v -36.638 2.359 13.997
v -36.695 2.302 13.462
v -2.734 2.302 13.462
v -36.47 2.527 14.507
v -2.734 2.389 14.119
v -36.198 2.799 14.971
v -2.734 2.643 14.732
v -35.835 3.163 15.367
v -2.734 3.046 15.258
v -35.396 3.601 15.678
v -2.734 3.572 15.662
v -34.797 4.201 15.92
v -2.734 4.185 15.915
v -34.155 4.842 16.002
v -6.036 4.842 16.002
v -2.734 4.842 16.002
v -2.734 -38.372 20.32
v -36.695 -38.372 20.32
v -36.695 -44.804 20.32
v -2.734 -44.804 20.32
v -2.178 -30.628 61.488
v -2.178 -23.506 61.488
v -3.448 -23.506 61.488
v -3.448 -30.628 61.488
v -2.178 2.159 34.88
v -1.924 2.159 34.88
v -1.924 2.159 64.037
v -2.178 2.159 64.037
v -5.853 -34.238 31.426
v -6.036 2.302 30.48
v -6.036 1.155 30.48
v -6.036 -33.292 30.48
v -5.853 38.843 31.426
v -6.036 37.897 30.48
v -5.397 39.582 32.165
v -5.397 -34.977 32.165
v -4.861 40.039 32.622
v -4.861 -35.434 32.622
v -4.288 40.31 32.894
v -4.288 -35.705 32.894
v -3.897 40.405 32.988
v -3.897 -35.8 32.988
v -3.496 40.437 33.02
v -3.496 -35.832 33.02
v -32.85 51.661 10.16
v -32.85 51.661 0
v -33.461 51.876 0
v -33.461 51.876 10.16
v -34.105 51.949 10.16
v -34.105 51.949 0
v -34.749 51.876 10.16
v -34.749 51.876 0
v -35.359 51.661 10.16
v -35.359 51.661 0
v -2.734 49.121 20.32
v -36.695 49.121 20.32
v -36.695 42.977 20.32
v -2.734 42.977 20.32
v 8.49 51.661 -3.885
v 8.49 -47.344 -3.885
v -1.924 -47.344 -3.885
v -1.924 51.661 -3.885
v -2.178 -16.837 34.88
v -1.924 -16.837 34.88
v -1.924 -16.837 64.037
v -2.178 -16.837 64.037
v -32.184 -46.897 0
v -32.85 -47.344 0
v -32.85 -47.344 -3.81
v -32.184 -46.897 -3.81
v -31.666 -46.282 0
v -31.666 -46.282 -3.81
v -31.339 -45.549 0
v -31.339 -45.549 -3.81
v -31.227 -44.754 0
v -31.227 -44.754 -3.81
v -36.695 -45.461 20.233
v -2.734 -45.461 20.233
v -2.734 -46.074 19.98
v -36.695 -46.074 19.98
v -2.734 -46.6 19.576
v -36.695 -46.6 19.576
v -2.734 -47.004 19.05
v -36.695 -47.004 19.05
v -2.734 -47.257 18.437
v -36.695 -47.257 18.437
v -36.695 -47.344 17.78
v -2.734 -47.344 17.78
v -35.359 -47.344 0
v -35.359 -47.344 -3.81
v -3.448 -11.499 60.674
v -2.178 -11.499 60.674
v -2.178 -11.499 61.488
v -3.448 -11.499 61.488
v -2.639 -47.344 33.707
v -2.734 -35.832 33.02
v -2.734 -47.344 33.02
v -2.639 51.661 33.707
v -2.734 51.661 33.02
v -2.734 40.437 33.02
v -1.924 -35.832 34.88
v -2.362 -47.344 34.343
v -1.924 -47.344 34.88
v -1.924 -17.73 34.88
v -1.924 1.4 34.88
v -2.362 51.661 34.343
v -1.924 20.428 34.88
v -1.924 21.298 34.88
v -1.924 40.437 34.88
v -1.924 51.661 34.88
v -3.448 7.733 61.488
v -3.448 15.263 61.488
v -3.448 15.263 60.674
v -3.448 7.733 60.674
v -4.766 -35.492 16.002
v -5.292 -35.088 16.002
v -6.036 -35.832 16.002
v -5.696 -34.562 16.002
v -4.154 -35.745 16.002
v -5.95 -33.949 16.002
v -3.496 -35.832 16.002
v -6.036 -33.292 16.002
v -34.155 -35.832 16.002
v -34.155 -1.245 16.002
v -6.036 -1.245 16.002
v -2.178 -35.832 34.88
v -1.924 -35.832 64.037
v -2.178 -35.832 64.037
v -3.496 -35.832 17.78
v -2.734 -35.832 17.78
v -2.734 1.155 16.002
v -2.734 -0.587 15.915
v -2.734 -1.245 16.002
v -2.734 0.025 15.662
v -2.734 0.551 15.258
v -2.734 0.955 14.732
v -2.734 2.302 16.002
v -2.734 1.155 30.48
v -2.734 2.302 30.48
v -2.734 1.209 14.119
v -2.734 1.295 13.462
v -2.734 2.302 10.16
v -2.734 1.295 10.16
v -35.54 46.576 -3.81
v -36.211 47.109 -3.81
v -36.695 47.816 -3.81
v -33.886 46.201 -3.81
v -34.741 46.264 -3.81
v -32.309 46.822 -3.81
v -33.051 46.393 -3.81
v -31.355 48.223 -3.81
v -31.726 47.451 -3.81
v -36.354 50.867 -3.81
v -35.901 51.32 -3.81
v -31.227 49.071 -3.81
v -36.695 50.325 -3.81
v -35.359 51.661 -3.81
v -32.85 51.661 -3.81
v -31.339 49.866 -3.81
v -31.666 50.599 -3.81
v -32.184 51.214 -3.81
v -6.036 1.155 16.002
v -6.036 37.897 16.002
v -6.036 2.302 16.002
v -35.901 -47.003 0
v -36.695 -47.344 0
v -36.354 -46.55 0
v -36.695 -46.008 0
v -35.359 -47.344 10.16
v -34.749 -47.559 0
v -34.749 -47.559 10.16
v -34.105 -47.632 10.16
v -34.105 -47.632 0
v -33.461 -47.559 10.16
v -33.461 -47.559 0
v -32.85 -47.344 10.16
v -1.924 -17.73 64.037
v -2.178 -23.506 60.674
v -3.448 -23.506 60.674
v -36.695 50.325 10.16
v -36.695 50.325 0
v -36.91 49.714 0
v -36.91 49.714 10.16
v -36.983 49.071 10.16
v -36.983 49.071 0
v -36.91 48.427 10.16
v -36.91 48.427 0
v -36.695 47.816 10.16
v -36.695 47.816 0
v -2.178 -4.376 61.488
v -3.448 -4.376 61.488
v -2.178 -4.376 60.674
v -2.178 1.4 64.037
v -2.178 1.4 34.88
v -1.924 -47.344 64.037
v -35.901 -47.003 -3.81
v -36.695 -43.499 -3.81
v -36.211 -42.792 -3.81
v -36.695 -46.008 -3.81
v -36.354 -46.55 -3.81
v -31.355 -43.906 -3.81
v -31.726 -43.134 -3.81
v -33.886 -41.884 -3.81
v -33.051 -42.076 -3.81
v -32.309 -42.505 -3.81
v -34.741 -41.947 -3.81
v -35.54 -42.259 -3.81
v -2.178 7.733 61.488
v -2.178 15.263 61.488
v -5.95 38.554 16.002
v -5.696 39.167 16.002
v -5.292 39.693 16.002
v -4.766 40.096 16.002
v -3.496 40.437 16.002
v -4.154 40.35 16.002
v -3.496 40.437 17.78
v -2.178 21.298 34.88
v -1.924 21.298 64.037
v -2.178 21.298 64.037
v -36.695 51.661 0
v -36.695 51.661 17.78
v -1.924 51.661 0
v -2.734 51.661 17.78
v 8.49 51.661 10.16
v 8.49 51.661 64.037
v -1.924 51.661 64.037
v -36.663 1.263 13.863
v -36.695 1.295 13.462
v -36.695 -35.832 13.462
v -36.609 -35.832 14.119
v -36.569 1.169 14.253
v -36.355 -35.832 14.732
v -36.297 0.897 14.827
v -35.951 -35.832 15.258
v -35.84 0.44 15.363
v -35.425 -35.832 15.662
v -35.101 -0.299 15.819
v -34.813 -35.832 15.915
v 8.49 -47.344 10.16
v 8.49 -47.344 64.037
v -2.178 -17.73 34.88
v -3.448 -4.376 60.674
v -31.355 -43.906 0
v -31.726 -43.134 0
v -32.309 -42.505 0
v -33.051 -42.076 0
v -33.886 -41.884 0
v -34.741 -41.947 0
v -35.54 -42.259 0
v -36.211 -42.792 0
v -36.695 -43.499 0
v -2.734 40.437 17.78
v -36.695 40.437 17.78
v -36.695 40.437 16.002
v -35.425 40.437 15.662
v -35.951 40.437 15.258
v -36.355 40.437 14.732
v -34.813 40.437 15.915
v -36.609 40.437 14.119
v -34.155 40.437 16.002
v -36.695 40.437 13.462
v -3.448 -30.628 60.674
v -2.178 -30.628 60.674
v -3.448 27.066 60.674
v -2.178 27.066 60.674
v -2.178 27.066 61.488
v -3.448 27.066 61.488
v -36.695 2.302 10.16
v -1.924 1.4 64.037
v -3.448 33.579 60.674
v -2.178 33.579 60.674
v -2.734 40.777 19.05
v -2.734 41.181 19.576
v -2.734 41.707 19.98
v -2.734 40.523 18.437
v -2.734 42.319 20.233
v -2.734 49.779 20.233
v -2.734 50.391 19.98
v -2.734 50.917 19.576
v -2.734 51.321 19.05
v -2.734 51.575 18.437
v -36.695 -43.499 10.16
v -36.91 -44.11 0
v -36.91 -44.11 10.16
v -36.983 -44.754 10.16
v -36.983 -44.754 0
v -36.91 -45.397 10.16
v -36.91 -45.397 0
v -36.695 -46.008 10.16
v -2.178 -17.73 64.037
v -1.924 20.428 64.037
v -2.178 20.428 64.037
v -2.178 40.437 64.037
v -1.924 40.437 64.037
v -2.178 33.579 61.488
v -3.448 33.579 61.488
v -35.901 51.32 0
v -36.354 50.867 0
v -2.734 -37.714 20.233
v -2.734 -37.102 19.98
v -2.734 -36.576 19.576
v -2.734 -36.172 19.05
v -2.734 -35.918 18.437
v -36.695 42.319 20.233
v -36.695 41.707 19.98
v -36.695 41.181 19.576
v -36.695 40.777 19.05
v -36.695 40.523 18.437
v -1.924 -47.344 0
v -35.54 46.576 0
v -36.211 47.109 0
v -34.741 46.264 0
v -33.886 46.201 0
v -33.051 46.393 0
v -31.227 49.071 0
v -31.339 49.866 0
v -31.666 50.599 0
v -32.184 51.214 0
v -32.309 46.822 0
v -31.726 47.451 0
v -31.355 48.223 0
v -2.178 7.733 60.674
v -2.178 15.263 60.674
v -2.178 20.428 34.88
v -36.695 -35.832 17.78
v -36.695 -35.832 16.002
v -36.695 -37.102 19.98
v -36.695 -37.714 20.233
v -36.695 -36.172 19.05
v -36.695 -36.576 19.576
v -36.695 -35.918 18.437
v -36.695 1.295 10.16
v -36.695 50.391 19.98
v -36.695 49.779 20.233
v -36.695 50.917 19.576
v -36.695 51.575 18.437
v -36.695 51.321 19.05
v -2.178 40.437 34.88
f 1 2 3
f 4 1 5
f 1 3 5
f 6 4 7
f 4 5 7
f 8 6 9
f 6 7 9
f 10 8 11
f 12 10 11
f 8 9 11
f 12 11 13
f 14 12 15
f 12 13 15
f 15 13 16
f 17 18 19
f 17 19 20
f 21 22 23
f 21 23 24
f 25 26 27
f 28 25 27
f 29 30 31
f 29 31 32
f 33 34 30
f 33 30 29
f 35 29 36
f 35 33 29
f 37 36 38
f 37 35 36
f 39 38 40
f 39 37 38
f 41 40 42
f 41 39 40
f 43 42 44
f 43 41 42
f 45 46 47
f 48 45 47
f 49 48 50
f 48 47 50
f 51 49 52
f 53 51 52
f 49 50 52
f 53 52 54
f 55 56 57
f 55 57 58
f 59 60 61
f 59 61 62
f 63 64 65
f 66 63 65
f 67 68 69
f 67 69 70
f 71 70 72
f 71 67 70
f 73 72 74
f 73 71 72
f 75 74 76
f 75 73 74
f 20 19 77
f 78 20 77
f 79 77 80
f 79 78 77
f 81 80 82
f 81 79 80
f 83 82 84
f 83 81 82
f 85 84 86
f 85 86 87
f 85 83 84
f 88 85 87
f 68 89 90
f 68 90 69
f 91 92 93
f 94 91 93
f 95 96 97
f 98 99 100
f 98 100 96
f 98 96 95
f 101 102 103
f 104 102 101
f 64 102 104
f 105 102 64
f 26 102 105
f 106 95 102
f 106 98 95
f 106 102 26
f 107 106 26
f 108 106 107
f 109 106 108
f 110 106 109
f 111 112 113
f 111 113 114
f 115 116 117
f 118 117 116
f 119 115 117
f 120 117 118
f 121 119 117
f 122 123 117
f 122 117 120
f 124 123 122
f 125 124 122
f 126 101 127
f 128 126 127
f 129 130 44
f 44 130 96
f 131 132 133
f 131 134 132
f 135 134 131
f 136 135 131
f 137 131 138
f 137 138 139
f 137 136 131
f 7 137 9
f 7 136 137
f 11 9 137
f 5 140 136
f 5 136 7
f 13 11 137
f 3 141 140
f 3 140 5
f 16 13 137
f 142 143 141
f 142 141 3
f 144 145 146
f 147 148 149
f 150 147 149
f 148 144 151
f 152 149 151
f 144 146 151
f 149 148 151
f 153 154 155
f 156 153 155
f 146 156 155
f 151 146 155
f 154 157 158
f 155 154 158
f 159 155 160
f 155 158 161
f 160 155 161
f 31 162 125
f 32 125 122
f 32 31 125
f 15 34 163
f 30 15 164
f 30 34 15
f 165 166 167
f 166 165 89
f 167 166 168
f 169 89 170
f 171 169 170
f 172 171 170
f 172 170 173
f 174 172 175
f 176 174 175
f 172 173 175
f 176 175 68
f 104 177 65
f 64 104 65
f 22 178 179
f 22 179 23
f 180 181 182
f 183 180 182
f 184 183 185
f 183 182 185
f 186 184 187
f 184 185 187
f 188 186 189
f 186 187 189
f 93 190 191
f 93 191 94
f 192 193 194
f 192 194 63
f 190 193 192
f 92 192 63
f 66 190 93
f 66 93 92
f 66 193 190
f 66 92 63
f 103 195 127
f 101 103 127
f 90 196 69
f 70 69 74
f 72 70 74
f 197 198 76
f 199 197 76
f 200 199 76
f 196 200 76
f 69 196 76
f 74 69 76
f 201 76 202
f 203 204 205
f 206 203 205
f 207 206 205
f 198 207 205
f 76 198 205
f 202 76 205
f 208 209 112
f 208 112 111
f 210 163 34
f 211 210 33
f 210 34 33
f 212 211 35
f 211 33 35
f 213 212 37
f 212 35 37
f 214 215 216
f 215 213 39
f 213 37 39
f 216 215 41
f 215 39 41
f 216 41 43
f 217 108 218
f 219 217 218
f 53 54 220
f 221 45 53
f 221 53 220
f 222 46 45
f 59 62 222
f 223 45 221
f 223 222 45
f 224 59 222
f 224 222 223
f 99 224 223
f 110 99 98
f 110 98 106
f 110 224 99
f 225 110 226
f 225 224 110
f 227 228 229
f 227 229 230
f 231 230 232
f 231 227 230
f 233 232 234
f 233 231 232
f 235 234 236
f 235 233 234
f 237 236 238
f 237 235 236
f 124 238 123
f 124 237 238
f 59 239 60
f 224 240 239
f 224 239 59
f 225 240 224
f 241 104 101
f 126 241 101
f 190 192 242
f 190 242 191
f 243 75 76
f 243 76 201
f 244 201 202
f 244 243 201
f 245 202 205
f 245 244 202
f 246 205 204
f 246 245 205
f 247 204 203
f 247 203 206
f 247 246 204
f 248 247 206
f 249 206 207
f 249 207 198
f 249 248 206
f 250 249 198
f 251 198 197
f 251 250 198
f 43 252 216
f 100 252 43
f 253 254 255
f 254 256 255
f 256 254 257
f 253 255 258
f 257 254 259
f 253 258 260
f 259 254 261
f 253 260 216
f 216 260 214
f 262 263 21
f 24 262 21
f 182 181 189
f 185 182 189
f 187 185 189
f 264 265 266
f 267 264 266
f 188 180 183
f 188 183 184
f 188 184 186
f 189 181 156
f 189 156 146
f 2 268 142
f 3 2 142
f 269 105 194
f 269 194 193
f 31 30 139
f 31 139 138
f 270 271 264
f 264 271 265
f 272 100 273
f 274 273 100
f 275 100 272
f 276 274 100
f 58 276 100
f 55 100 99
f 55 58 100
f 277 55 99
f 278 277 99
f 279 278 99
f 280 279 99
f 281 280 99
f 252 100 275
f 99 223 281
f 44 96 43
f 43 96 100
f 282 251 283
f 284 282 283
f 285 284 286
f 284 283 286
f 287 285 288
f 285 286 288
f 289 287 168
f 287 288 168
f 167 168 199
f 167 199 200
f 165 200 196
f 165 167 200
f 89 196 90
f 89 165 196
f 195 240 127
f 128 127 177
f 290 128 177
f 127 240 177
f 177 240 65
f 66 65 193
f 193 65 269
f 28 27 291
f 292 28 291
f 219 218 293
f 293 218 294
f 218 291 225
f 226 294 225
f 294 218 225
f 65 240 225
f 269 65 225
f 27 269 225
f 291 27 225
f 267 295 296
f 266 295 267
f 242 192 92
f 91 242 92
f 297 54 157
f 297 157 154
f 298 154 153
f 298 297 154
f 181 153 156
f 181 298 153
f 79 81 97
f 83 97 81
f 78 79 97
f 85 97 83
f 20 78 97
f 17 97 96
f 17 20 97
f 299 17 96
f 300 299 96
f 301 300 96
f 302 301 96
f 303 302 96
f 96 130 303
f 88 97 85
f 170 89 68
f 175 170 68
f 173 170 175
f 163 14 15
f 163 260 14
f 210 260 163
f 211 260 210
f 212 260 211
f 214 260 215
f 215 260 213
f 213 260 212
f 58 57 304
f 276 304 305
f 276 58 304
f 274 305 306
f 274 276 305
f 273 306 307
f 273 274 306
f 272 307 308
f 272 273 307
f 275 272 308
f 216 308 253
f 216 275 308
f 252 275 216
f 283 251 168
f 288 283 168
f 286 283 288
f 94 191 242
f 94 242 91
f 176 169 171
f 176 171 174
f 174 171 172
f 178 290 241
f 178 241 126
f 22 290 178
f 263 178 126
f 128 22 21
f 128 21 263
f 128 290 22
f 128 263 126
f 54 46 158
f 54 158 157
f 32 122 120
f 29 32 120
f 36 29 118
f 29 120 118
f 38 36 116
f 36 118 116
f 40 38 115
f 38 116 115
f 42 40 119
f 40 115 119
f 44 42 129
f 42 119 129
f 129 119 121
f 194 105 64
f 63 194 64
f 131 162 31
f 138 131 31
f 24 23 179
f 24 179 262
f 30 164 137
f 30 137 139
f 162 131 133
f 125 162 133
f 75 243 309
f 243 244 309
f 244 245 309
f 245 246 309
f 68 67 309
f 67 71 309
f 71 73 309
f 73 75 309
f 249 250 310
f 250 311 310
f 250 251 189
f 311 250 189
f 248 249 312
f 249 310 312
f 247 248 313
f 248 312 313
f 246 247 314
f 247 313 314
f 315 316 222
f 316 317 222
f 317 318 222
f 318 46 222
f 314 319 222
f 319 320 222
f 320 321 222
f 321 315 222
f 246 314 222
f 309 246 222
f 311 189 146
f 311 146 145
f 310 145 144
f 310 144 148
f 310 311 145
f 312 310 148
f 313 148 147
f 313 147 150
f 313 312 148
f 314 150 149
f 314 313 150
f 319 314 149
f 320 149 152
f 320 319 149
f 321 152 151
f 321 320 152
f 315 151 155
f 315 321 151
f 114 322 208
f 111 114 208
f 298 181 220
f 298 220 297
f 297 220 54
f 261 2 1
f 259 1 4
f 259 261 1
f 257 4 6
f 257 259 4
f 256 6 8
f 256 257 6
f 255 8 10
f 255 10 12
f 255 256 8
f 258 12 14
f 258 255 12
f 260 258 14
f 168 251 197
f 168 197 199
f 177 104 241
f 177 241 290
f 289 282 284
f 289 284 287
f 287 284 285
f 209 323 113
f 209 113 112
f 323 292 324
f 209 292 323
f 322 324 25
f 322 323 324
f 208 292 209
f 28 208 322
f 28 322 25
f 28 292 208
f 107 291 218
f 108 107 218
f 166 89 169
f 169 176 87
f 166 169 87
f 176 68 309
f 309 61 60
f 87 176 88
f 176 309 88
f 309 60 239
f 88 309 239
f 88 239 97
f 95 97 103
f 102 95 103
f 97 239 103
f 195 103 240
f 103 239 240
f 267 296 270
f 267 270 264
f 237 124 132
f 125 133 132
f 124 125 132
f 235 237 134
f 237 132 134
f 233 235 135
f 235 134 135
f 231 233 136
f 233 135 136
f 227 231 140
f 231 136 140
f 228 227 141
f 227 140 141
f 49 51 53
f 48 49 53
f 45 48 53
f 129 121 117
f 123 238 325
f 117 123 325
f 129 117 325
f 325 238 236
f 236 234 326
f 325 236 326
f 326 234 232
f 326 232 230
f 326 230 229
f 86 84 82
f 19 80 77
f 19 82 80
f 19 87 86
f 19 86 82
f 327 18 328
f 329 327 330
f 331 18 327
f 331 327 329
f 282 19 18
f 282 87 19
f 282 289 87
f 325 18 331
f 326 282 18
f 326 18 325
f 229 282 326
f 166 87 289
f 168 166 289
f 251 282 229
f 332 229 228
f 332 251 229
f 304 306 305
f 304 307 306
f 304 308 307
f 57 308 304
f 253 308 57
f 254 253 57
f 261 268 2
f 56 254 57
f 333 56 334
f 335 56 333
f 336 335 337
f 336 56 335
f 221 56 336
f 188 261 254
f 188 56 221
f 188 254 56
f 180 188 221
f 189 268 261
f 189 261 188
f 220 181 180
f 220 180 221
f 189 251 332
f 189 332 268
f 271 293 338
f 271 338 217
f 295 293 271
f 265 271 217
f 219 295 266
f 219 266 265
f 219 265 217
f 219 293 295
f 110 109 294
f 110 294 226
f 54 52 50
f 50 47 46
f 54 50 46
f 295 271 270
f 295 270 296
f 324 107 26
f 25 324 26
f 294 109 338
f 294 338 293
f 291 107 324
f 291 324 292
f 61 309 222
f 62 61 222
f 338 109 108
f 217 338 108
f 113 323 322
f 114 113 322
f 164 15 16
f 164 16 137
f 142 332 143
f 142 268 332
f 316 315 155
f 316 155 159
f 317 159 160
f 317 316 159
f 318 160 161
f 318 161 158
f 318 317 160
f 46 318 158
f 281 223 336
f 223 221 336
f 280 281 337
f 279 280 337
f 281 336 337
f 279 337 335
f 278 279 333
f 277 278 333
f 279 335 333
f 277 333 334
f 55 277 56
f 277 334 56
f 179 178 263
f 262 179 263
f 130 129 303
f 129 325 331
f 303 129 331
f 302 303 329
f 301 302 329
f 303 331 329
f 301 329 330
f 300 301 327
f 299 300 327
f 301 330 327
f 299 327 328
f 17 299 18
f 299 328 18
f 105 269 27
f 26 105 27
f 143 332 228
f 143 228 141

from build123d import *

# Parameters (mm, degrees)
F0_W          = 22.5927522406
F0_H          = 49.5025906712
F1_DEPTH      = 10.16
F2_DEPTH      = 3.81
F3_W          = 11.2244246993
F3_H          = 99.0051813424
F4_DEPTH      = 25.4
F6_DEPTH      = 10.16
F7_R          = 2.54
F8_W          = 33.9610797819
F8_H          = 38.1342638284
F8_H_2        = 37.1269418392
F9_DEPTH      = 5.842
F10_R         = 2.54
F11_W         = 99.0051813424
F11_H         = 67.9221570026
F12_DEPTH     = 10.414
F13_W         = 38.620619569
F13_H         = 17.018
F13_W_2       = 37.6479080878
F14_DEPTH     = 3.302
F15_T1_DEPTH  = 88.9685276568
F15_T6_DEPTH  = 27.94
F15_T11_DEPTH = 27.94
F16_W         = 1.1473407503
F16_H         = 14.478
F17_DEPTH     = 3.302
F18_W         = 19.139082171
F18_H         = 29.1566260799
F18_W_2       = 6.5123029053
F18_H_2       = 0.8140355349
F18_W_3       = 18.2694643736
F18_W_4       = 7.5298482552
F18_W_5       = 18.2365168585
F18_W_6       = 7.1228295565
F18_W_7       = 18.1018151343
F18_W_8       = 7.1228314191
F19_DEPTH     = 0.254
F20_DEPTH     = 1.524


# Not quite as in the source:
# - a fillet or chamfer that OpenCascade refuses, or shapes differently, is made with other operations: its cross-section is extruded or revolved along the edge and cut away or added
# - a feature names something its author has since deleted; it is built from what else it names


with BuildPart() as f1:
    # F0 (on Top) → F1 (new body)
    with BuildSketch(Plane.XY):
        with BuildLine():
            Line((-35.3594812499, 51.6611337662), (-36.6952344775, 51.6611337662))
            Line((-36.6952344775, 51.6611337662), (-36.6952344775, 50.3253805386))
            ThreePointArc((-36.6952344775, 50.3253805386), (-36.1400711383, 51.105970427), (-35.3594812499, 51.6611337662))
        make_face()
        with BuildLine():
            ThreePointArc((-32.8504798068, 51.6611337662), (-34.1049805284, 51.9489325583), (-35.3594812499, 51.6611337662))
            Line((-35.3594812499, 51.6611337662), (-32.8504798068, 51.6611337662))
        make_face()
        with BuildLine():
            Line((-32.8504798068, 51.6611337662), (-35.3594812499, 51.6611337662))
            ThreePointArc((-35.3594812499, 51.6611337662), (-36.1400711383, 51.105970427), (-36.6952344775, 50.3253805386))
            Line((-36.6952344775, 50.3253805386), (-36.6952344775, 47.8163790954))
            ThreePointArc((-36.6952344775, 47.8163790954), (-33.4614356183, 46.2656993361), (-31.2269277871, 49.070879817))
            ThreePointArc((-31.2269277871, 49.070879817), (-31.6663634179, 50.5993869876), (-32.8504798068, 51.6611337662))
        make_face()
        with BuildLine():
            Line((-36.6952344775, 47.8163790954), (-36.6952344775, 50.3253805386))
            ThreePointArc((-36.6952344775, 50.3253805386), (-36.9830332696, 49.070879817), (-36.6952344775, 47.8163790954))
        make_face()
        with BuildLine():
            Line((-14.1024822369, 51.6611337662), (-32.8504798068, 51.6611337662))
            ThreePointArc((-32.8504798068, 51.6611337662), (-31.6663634179, 50.5993869876), (-31.2269277871, 49.070879817))
            ThreePointArc((-31.2269277871, 49.070879817), (-33.4614356183, 46.2656993361), (-36.6952344775, 47.8163790954))
            Line((-36.6952344775, 47.8163790954), (-36.6952344775, 2.158543095))
            Line((-36.6952344775, 2.158543095), (-14.1024822369, 2.158543095))
            Line((-14.1024822369, 2.158543095), (-14.1024822369, 51.6611337662))
        make_face()
        with Locations((-2.8061061166, 26.9098384306)):
            Rectangle(F0_W, F0_H)
        with BuildLine():
            Line((-14.1024822369, 2.158543095), (-36.6952344775, 2.158543095))
            Line((-36.6952344775, 2.158543095), (-36.6952344775, -43.4992929054))
            ThreePointArc((-36.6952344775, -43.4992929054), (-33.4614356183, -41.9486131461), (-31.2269277871, -44.753793627))
            ThreePointArc((-31.2269277871, -44.753793627), (-31.6663634179, -46.2823007976), (-32.8504798068, -47.3440475762))
            Line((-32.8504798068, -47.3440475762), (-14.1024822369, -47.3440475762))
            Line((-14.1024822369, -47.3440475762), (-14.1024822369, 2.158543095))
        make_face()
        with Locations((-2.8061061166, -22.5927522406)):
            Rectangle(F0_W, F0_H)
        with BuildLine():
            ThreePointArc((-31.2269277871, -44.753793627), (-33.4614356183, -41.9486131461), (-36.6952344775, -43.4992929054))
            Line((-36.6952344775, -43.4992929054), (-36.6952344775, -46.0082943486))
            ThreePointArc((-36.6952344775, -46.0082943486), (-36.1400711383, -46.788884237), (-35.3594812499, -47.3440475762))
            Line((-35.3594812499, -47.3440475762), (-32.8504798068, -47.3440475762))
            ThreePointArc((-32.8504798068, -47.3440475762), (-31.6663634179, -46.2823007976), (-31.2269277871, -44.753793627))
        make_face()
        with BuildLine():
            Line((-36.6952344775, -46.0082943486), (-36.6952344775, -43.4992929054))
            ThreePointArc((-36.6952344775, -43.4992929054), (-36.9830332696, -44.753793627), (-36.6952344775, -46.0082943486))
        make_face()
        with BuildLine():
            ThreePointArc((-35.3594812499, -47.3440475762), (-36.1400711383, -46.788884237), (-36.6952344775, -46.0082943486))
            Line((-36.6952344775, -46.0082943486), (-36.6952344775, -47.3440475762))
            Line((-36.6952344775, -47.3440475762), (-35.3594812499, -47.3440475762))
        make_face()
        with BuildLine():
            ThreePointArc((-35.3594812499, -47.3440475762), (-34.1049805284, -47.6318463683), (-32.8504798068, -47.3440475762))
            Line((-32.8504798068, -47.3440475762), (-35.3594812499, -47.3440475762))
        make_face()
    extrude(amount=F1_DEPTH)

    # F0 (on Top) → F2 (join)
    with BuildSketch(Plane.XY):
        with BuildLine():
            Line((-32.8504798068, 51.6611337662), (-35.3594812499, 51.6611337662))
            ThreePointArc((-35.3594812499, 51.6611337662), (-36.1400711383, 51.105970427), (-36.6952344775, 50.3253805386))
            Line((-36.6952344775, 50.3253805386), (-36.6952344775, 47.8163790954))
            ThreePointArc((-36.6952344775, 47.8163790954), (-33.4614356183, 46.2656993361), (-31.2269277871, 49.070879817))
            ThreePointArc((-31.2269277871, 49.070879817), (-31.6663634179, 50.5993869876), (-32.8504798068, 51.6611337662))
        make_face()
        with BuildLine():
            ThreePointArc((-31.2269277871, -44.753793627), (-33.4614356183, -41.9486131461), (-36.6952344775, -43.4992929054))
            Line((-36.6952344775, -43.4992929054), (-36.6952344775, -46.0082943486))
            ThreePointArc((-36.6952344775, -46.0082943486), (-36.1400711383, -46.788884237), (-35.3594812499, -47.3440475762))
            Line((-35.3594812499, -47.3440475762), (-32.8504798068, -47.3440475762))
            ThreePointArc((-32.8504798068, -47.3440475762), (-31.6663634179, -46.2823007976), (-31.2269277871, -44.753793627))
        make_face()
    extrude(amount=-F2_DEPTH)

    # F3 (on face) → F4 (join)
    with BuildSketch(Plane.XY.offset(10.16)):
        with Locations((2.878057654, 2.158543095)):
            Rectangle(F3_W, F3_H)
    extrude(amount=F4_DEPTH)

    # F5 (on face) → F6 (join)
    with BuildSketch(Plane.XY.offset(10.16)):
        Polygon((-2.7341546956, 40.4367111623), (-2.7341546956, 51.6611337662), (-32.8504798068, 51.6611337662), (-35.3594812499, 51.6611337662), (-36.6952344775, 51.6611337662), (-36.6952344775, 50.3253805386), (-36.6952344775, 47.8163790954), (-36.6952344775, 40.4367111623), align=None)
        Polygon((-2.7341546956, -47.3440475762), (-2.7341546956, -35.8318164945), (-36.6952344775, -35.8318164945), (-36.6952344775, -43.4992929054), (-36.6952344775, -46.0082943486), (-36.6952344775, -47.3440475762), (-35.3594812499, -47.3440475762), (-32.8504798068, -47.3440475762), align=None)
    extrude(amount=F6_DEPTH)

    # F7
    f7_edges = [f1.edges().sort_by_distance(p)[0] for p in [
        (-2.734155, 2.158543, 35.56),
        (-19.714695, -35.831816, 20.32),
        (-19.714695, -47.344048, 20.32),
        (-19.714695, 51.661134, 20.32),
        (-19.714695, 40.436711, 20.32),
    ]]
    fillet(f7_edges, radius=F7_R)

    # F8 (on face) → F9 (join)
    with BuildSketch(Plane.XY.offset(10.16)):
        with Locations((-19.7146945866, 21.3695792481)):
            Rectangle(F8_W, F8_H)
        with Locations((-19.7146945866, -17.2683455748)):
            Rectangle(F8_W, F8_H_2)
    extrude(amount=F9_DEPTH)

    # F10
    f10_edges = [f1.edges().sort_by_distance(p)[0] for p in [
        (-19.714695, 1.295125, 16.002),
        (-19.714695, 2.302447, 16.002),
        (-36.695234, -17.268346, 16.002),
        (-36.695234, 21.369579, 16.002),
    ]]
    fillet(f10_edges, radius=F10_R)

    # F11 (on face) → F12 (join)
    with BuildSketch(Plane.YZ.offset(8.4902700037)):
        with Locations((2.158543095, 30.0757006044)):
            Rectangle(F11_W, F11_H)
    extrude(amount=-F12_DEPTH)

    # F13 (on face) → F14 (join)
    with BuildSketch(Plane(origin=(-2.7341546956, 0, 0), x_dir=(0, -1, 0), z_dir=(-1, 0, 0))):
        with Locations((-21.1264013778, 24.511)):
            Rectangle(F13_W, F13_H)
        with Locations((17.0078624506, 24.511)):
            Rectangle(F13_W_2, F13_H)
    extrude(amount=F14_DEPTH)

    # F15: fillet of radius 2.54 on 3 edges, made by hand

    # F15_s2 → F15_t1 (cut)
    with BuildSketch(Plane.XZ.offset(-46.7867111623)):
        with BuildLine():
            ThreePointArc((-6.0361546956, 30.48), (-5.2922059199, 32.2760512242), (-3.4961546956, 33.02))
            Line((-3.4961546956, 33.02), (-6.0361546956, 33.02))
            Line((-6.0361546956, 33.02), (-6.0361546956, 30.48))
        make_face()
    extrude(amount=F15_T1_DEPTH, mode=Mode.SUBTRACT)


with BuildPart() as f15_tool4:
    # F15_s5 → F15_t6 (new body)
    with BuildSketch(Plane.XY.offset(39.37)):
        with BuildLine():
            ThreePointArc((-6.0361546956, 37.8967111623), (-5.2922059199, 39.6927623865), (-3.4961546956, 40.4367111623))
            Line((-3.4961546956, 40.4367111623), (-6.0361546956, 40.4367111623))
            Line((-6.0361546956, 40.4367111623), (-6.0361546956, 37.8967111623))
        make_face()
    extrude(amount=-F15_T6_DEPTH)

    split(bisect_by=Plane.XY.offset(16.002), keep=Keep.TOP)


with BuildPart() as f1_1:
    add(f1.part)

    # F15_t3: cut F15_tool4
    add(f15_tool4.part, mode=Mode.SUBTRACT)


with BuildPart() as f15_tool9:
    # F15_s10 → F15_t11 (new body)
    with BuildSketch(Plane.XY.offset(11.43)):
        with BuildLine():
            ThreePointArc((-6.0361546956, -33.2918164945), (-5.2922059199, -35.0878677187), (-3.4961546956, -35.8318164945))
            Line((-3.4961546956, -35.8318164945), (-6.0361546956, -35.8318164945))
            Line((-6.0361546956, -35.8318164945), (-6.0361546956, -33.2918164945))
        make_face()
    extrude(amount=F15_T11_DEPTH)

    split(bisect_by=Plane.XY.offset(16.002), keep=Keep.TOP)


with BuildPart() as f1_2:
    add(f1_1.part)

    # F15_t8: cut F15_tool9
    add(f15_tool9.part, mode=Mode.SUBTRACT)

    # F16 (on face) → F17 (cut)
    with BuildSketch(Plane(origin=(-6.0361546956, 0, 0), x_dir=(0, -1, 0), z_dir=(-1, 0, 0))):
        with Locations((-1.7287769588, 23.241)):
            Rectangle(F16_W, F16_H)
    extrude(amount=-F17_DEPTH, mode=Mode.SUBTRACT)

    # F18 (on face) → F19 (join)
    with BuildSketch(Plane(origin=(-1.9237299963, 0, 0), x_dir=(0, -1, 0), z_dir=(-1, 0, 0))):
        with Locations((-30.8671663515, 49.4584660657)):
            Rectangle(F18_W, F18_H)
        with Locations((-30.3225759417, 61.080571264)):
            Rectangle(F18_W_2, F18_H_2, mode=Mode.SUBTRACT)
        with Locations((-11.2932752818, 49.4584660657)):
            Rectangle(F18_W_3, F18_H)
        with Locations((-11.4979553036, 61.080571264)):
            Rectangle(F18_W_4, F18_H_2, mode=Mode.SUBTRACT)
        with Locations((7.7183801332, 49.4584660657)):
            Rectangle(F18_W_5, F18_H)
        with Locations((7.9371919855, 61.080571264)):
            Rectangle(F18_W_6, F18_H_2, mode=Mode.SUBTRACT)
        with Locations((26.7809126526, 49.4584660657)):
            Rectangle(F18_W_7, F18_H)
        with Locations((27.0670773461, 61.080571264)):
            Rectangle(F18_W_8, F18_H_2, mode=Mode.SUBTRACT)
    extrude(amount=F19_DEPTH)

    # F18 (on face) → F20 (join)
    with BuildSketch(Plane(origin=(-1.9237299963, 0, 0), x_dir=(0, -1, 0), z_dir=(-1, 0, 0))):
        with Locations((27.0670773461, 61.080571264)):
            Rectangle(F18_W_8, F18_H_2)
        with Locations((7.9371919855, 61.080571264)):
            Rectangle(F18_W_6, F18_H_2)
        with Locations((-11.4979553036, 61.080571264)):
            Rectangle(F18_W_4, F18_H_2)
        with Locations((-30.3225759417, 61.080571264)):
            Rectangle(F18_W_2, F18_H_2)
    extrude(amount=F20_DEPTH)


solid = f1_2.part
